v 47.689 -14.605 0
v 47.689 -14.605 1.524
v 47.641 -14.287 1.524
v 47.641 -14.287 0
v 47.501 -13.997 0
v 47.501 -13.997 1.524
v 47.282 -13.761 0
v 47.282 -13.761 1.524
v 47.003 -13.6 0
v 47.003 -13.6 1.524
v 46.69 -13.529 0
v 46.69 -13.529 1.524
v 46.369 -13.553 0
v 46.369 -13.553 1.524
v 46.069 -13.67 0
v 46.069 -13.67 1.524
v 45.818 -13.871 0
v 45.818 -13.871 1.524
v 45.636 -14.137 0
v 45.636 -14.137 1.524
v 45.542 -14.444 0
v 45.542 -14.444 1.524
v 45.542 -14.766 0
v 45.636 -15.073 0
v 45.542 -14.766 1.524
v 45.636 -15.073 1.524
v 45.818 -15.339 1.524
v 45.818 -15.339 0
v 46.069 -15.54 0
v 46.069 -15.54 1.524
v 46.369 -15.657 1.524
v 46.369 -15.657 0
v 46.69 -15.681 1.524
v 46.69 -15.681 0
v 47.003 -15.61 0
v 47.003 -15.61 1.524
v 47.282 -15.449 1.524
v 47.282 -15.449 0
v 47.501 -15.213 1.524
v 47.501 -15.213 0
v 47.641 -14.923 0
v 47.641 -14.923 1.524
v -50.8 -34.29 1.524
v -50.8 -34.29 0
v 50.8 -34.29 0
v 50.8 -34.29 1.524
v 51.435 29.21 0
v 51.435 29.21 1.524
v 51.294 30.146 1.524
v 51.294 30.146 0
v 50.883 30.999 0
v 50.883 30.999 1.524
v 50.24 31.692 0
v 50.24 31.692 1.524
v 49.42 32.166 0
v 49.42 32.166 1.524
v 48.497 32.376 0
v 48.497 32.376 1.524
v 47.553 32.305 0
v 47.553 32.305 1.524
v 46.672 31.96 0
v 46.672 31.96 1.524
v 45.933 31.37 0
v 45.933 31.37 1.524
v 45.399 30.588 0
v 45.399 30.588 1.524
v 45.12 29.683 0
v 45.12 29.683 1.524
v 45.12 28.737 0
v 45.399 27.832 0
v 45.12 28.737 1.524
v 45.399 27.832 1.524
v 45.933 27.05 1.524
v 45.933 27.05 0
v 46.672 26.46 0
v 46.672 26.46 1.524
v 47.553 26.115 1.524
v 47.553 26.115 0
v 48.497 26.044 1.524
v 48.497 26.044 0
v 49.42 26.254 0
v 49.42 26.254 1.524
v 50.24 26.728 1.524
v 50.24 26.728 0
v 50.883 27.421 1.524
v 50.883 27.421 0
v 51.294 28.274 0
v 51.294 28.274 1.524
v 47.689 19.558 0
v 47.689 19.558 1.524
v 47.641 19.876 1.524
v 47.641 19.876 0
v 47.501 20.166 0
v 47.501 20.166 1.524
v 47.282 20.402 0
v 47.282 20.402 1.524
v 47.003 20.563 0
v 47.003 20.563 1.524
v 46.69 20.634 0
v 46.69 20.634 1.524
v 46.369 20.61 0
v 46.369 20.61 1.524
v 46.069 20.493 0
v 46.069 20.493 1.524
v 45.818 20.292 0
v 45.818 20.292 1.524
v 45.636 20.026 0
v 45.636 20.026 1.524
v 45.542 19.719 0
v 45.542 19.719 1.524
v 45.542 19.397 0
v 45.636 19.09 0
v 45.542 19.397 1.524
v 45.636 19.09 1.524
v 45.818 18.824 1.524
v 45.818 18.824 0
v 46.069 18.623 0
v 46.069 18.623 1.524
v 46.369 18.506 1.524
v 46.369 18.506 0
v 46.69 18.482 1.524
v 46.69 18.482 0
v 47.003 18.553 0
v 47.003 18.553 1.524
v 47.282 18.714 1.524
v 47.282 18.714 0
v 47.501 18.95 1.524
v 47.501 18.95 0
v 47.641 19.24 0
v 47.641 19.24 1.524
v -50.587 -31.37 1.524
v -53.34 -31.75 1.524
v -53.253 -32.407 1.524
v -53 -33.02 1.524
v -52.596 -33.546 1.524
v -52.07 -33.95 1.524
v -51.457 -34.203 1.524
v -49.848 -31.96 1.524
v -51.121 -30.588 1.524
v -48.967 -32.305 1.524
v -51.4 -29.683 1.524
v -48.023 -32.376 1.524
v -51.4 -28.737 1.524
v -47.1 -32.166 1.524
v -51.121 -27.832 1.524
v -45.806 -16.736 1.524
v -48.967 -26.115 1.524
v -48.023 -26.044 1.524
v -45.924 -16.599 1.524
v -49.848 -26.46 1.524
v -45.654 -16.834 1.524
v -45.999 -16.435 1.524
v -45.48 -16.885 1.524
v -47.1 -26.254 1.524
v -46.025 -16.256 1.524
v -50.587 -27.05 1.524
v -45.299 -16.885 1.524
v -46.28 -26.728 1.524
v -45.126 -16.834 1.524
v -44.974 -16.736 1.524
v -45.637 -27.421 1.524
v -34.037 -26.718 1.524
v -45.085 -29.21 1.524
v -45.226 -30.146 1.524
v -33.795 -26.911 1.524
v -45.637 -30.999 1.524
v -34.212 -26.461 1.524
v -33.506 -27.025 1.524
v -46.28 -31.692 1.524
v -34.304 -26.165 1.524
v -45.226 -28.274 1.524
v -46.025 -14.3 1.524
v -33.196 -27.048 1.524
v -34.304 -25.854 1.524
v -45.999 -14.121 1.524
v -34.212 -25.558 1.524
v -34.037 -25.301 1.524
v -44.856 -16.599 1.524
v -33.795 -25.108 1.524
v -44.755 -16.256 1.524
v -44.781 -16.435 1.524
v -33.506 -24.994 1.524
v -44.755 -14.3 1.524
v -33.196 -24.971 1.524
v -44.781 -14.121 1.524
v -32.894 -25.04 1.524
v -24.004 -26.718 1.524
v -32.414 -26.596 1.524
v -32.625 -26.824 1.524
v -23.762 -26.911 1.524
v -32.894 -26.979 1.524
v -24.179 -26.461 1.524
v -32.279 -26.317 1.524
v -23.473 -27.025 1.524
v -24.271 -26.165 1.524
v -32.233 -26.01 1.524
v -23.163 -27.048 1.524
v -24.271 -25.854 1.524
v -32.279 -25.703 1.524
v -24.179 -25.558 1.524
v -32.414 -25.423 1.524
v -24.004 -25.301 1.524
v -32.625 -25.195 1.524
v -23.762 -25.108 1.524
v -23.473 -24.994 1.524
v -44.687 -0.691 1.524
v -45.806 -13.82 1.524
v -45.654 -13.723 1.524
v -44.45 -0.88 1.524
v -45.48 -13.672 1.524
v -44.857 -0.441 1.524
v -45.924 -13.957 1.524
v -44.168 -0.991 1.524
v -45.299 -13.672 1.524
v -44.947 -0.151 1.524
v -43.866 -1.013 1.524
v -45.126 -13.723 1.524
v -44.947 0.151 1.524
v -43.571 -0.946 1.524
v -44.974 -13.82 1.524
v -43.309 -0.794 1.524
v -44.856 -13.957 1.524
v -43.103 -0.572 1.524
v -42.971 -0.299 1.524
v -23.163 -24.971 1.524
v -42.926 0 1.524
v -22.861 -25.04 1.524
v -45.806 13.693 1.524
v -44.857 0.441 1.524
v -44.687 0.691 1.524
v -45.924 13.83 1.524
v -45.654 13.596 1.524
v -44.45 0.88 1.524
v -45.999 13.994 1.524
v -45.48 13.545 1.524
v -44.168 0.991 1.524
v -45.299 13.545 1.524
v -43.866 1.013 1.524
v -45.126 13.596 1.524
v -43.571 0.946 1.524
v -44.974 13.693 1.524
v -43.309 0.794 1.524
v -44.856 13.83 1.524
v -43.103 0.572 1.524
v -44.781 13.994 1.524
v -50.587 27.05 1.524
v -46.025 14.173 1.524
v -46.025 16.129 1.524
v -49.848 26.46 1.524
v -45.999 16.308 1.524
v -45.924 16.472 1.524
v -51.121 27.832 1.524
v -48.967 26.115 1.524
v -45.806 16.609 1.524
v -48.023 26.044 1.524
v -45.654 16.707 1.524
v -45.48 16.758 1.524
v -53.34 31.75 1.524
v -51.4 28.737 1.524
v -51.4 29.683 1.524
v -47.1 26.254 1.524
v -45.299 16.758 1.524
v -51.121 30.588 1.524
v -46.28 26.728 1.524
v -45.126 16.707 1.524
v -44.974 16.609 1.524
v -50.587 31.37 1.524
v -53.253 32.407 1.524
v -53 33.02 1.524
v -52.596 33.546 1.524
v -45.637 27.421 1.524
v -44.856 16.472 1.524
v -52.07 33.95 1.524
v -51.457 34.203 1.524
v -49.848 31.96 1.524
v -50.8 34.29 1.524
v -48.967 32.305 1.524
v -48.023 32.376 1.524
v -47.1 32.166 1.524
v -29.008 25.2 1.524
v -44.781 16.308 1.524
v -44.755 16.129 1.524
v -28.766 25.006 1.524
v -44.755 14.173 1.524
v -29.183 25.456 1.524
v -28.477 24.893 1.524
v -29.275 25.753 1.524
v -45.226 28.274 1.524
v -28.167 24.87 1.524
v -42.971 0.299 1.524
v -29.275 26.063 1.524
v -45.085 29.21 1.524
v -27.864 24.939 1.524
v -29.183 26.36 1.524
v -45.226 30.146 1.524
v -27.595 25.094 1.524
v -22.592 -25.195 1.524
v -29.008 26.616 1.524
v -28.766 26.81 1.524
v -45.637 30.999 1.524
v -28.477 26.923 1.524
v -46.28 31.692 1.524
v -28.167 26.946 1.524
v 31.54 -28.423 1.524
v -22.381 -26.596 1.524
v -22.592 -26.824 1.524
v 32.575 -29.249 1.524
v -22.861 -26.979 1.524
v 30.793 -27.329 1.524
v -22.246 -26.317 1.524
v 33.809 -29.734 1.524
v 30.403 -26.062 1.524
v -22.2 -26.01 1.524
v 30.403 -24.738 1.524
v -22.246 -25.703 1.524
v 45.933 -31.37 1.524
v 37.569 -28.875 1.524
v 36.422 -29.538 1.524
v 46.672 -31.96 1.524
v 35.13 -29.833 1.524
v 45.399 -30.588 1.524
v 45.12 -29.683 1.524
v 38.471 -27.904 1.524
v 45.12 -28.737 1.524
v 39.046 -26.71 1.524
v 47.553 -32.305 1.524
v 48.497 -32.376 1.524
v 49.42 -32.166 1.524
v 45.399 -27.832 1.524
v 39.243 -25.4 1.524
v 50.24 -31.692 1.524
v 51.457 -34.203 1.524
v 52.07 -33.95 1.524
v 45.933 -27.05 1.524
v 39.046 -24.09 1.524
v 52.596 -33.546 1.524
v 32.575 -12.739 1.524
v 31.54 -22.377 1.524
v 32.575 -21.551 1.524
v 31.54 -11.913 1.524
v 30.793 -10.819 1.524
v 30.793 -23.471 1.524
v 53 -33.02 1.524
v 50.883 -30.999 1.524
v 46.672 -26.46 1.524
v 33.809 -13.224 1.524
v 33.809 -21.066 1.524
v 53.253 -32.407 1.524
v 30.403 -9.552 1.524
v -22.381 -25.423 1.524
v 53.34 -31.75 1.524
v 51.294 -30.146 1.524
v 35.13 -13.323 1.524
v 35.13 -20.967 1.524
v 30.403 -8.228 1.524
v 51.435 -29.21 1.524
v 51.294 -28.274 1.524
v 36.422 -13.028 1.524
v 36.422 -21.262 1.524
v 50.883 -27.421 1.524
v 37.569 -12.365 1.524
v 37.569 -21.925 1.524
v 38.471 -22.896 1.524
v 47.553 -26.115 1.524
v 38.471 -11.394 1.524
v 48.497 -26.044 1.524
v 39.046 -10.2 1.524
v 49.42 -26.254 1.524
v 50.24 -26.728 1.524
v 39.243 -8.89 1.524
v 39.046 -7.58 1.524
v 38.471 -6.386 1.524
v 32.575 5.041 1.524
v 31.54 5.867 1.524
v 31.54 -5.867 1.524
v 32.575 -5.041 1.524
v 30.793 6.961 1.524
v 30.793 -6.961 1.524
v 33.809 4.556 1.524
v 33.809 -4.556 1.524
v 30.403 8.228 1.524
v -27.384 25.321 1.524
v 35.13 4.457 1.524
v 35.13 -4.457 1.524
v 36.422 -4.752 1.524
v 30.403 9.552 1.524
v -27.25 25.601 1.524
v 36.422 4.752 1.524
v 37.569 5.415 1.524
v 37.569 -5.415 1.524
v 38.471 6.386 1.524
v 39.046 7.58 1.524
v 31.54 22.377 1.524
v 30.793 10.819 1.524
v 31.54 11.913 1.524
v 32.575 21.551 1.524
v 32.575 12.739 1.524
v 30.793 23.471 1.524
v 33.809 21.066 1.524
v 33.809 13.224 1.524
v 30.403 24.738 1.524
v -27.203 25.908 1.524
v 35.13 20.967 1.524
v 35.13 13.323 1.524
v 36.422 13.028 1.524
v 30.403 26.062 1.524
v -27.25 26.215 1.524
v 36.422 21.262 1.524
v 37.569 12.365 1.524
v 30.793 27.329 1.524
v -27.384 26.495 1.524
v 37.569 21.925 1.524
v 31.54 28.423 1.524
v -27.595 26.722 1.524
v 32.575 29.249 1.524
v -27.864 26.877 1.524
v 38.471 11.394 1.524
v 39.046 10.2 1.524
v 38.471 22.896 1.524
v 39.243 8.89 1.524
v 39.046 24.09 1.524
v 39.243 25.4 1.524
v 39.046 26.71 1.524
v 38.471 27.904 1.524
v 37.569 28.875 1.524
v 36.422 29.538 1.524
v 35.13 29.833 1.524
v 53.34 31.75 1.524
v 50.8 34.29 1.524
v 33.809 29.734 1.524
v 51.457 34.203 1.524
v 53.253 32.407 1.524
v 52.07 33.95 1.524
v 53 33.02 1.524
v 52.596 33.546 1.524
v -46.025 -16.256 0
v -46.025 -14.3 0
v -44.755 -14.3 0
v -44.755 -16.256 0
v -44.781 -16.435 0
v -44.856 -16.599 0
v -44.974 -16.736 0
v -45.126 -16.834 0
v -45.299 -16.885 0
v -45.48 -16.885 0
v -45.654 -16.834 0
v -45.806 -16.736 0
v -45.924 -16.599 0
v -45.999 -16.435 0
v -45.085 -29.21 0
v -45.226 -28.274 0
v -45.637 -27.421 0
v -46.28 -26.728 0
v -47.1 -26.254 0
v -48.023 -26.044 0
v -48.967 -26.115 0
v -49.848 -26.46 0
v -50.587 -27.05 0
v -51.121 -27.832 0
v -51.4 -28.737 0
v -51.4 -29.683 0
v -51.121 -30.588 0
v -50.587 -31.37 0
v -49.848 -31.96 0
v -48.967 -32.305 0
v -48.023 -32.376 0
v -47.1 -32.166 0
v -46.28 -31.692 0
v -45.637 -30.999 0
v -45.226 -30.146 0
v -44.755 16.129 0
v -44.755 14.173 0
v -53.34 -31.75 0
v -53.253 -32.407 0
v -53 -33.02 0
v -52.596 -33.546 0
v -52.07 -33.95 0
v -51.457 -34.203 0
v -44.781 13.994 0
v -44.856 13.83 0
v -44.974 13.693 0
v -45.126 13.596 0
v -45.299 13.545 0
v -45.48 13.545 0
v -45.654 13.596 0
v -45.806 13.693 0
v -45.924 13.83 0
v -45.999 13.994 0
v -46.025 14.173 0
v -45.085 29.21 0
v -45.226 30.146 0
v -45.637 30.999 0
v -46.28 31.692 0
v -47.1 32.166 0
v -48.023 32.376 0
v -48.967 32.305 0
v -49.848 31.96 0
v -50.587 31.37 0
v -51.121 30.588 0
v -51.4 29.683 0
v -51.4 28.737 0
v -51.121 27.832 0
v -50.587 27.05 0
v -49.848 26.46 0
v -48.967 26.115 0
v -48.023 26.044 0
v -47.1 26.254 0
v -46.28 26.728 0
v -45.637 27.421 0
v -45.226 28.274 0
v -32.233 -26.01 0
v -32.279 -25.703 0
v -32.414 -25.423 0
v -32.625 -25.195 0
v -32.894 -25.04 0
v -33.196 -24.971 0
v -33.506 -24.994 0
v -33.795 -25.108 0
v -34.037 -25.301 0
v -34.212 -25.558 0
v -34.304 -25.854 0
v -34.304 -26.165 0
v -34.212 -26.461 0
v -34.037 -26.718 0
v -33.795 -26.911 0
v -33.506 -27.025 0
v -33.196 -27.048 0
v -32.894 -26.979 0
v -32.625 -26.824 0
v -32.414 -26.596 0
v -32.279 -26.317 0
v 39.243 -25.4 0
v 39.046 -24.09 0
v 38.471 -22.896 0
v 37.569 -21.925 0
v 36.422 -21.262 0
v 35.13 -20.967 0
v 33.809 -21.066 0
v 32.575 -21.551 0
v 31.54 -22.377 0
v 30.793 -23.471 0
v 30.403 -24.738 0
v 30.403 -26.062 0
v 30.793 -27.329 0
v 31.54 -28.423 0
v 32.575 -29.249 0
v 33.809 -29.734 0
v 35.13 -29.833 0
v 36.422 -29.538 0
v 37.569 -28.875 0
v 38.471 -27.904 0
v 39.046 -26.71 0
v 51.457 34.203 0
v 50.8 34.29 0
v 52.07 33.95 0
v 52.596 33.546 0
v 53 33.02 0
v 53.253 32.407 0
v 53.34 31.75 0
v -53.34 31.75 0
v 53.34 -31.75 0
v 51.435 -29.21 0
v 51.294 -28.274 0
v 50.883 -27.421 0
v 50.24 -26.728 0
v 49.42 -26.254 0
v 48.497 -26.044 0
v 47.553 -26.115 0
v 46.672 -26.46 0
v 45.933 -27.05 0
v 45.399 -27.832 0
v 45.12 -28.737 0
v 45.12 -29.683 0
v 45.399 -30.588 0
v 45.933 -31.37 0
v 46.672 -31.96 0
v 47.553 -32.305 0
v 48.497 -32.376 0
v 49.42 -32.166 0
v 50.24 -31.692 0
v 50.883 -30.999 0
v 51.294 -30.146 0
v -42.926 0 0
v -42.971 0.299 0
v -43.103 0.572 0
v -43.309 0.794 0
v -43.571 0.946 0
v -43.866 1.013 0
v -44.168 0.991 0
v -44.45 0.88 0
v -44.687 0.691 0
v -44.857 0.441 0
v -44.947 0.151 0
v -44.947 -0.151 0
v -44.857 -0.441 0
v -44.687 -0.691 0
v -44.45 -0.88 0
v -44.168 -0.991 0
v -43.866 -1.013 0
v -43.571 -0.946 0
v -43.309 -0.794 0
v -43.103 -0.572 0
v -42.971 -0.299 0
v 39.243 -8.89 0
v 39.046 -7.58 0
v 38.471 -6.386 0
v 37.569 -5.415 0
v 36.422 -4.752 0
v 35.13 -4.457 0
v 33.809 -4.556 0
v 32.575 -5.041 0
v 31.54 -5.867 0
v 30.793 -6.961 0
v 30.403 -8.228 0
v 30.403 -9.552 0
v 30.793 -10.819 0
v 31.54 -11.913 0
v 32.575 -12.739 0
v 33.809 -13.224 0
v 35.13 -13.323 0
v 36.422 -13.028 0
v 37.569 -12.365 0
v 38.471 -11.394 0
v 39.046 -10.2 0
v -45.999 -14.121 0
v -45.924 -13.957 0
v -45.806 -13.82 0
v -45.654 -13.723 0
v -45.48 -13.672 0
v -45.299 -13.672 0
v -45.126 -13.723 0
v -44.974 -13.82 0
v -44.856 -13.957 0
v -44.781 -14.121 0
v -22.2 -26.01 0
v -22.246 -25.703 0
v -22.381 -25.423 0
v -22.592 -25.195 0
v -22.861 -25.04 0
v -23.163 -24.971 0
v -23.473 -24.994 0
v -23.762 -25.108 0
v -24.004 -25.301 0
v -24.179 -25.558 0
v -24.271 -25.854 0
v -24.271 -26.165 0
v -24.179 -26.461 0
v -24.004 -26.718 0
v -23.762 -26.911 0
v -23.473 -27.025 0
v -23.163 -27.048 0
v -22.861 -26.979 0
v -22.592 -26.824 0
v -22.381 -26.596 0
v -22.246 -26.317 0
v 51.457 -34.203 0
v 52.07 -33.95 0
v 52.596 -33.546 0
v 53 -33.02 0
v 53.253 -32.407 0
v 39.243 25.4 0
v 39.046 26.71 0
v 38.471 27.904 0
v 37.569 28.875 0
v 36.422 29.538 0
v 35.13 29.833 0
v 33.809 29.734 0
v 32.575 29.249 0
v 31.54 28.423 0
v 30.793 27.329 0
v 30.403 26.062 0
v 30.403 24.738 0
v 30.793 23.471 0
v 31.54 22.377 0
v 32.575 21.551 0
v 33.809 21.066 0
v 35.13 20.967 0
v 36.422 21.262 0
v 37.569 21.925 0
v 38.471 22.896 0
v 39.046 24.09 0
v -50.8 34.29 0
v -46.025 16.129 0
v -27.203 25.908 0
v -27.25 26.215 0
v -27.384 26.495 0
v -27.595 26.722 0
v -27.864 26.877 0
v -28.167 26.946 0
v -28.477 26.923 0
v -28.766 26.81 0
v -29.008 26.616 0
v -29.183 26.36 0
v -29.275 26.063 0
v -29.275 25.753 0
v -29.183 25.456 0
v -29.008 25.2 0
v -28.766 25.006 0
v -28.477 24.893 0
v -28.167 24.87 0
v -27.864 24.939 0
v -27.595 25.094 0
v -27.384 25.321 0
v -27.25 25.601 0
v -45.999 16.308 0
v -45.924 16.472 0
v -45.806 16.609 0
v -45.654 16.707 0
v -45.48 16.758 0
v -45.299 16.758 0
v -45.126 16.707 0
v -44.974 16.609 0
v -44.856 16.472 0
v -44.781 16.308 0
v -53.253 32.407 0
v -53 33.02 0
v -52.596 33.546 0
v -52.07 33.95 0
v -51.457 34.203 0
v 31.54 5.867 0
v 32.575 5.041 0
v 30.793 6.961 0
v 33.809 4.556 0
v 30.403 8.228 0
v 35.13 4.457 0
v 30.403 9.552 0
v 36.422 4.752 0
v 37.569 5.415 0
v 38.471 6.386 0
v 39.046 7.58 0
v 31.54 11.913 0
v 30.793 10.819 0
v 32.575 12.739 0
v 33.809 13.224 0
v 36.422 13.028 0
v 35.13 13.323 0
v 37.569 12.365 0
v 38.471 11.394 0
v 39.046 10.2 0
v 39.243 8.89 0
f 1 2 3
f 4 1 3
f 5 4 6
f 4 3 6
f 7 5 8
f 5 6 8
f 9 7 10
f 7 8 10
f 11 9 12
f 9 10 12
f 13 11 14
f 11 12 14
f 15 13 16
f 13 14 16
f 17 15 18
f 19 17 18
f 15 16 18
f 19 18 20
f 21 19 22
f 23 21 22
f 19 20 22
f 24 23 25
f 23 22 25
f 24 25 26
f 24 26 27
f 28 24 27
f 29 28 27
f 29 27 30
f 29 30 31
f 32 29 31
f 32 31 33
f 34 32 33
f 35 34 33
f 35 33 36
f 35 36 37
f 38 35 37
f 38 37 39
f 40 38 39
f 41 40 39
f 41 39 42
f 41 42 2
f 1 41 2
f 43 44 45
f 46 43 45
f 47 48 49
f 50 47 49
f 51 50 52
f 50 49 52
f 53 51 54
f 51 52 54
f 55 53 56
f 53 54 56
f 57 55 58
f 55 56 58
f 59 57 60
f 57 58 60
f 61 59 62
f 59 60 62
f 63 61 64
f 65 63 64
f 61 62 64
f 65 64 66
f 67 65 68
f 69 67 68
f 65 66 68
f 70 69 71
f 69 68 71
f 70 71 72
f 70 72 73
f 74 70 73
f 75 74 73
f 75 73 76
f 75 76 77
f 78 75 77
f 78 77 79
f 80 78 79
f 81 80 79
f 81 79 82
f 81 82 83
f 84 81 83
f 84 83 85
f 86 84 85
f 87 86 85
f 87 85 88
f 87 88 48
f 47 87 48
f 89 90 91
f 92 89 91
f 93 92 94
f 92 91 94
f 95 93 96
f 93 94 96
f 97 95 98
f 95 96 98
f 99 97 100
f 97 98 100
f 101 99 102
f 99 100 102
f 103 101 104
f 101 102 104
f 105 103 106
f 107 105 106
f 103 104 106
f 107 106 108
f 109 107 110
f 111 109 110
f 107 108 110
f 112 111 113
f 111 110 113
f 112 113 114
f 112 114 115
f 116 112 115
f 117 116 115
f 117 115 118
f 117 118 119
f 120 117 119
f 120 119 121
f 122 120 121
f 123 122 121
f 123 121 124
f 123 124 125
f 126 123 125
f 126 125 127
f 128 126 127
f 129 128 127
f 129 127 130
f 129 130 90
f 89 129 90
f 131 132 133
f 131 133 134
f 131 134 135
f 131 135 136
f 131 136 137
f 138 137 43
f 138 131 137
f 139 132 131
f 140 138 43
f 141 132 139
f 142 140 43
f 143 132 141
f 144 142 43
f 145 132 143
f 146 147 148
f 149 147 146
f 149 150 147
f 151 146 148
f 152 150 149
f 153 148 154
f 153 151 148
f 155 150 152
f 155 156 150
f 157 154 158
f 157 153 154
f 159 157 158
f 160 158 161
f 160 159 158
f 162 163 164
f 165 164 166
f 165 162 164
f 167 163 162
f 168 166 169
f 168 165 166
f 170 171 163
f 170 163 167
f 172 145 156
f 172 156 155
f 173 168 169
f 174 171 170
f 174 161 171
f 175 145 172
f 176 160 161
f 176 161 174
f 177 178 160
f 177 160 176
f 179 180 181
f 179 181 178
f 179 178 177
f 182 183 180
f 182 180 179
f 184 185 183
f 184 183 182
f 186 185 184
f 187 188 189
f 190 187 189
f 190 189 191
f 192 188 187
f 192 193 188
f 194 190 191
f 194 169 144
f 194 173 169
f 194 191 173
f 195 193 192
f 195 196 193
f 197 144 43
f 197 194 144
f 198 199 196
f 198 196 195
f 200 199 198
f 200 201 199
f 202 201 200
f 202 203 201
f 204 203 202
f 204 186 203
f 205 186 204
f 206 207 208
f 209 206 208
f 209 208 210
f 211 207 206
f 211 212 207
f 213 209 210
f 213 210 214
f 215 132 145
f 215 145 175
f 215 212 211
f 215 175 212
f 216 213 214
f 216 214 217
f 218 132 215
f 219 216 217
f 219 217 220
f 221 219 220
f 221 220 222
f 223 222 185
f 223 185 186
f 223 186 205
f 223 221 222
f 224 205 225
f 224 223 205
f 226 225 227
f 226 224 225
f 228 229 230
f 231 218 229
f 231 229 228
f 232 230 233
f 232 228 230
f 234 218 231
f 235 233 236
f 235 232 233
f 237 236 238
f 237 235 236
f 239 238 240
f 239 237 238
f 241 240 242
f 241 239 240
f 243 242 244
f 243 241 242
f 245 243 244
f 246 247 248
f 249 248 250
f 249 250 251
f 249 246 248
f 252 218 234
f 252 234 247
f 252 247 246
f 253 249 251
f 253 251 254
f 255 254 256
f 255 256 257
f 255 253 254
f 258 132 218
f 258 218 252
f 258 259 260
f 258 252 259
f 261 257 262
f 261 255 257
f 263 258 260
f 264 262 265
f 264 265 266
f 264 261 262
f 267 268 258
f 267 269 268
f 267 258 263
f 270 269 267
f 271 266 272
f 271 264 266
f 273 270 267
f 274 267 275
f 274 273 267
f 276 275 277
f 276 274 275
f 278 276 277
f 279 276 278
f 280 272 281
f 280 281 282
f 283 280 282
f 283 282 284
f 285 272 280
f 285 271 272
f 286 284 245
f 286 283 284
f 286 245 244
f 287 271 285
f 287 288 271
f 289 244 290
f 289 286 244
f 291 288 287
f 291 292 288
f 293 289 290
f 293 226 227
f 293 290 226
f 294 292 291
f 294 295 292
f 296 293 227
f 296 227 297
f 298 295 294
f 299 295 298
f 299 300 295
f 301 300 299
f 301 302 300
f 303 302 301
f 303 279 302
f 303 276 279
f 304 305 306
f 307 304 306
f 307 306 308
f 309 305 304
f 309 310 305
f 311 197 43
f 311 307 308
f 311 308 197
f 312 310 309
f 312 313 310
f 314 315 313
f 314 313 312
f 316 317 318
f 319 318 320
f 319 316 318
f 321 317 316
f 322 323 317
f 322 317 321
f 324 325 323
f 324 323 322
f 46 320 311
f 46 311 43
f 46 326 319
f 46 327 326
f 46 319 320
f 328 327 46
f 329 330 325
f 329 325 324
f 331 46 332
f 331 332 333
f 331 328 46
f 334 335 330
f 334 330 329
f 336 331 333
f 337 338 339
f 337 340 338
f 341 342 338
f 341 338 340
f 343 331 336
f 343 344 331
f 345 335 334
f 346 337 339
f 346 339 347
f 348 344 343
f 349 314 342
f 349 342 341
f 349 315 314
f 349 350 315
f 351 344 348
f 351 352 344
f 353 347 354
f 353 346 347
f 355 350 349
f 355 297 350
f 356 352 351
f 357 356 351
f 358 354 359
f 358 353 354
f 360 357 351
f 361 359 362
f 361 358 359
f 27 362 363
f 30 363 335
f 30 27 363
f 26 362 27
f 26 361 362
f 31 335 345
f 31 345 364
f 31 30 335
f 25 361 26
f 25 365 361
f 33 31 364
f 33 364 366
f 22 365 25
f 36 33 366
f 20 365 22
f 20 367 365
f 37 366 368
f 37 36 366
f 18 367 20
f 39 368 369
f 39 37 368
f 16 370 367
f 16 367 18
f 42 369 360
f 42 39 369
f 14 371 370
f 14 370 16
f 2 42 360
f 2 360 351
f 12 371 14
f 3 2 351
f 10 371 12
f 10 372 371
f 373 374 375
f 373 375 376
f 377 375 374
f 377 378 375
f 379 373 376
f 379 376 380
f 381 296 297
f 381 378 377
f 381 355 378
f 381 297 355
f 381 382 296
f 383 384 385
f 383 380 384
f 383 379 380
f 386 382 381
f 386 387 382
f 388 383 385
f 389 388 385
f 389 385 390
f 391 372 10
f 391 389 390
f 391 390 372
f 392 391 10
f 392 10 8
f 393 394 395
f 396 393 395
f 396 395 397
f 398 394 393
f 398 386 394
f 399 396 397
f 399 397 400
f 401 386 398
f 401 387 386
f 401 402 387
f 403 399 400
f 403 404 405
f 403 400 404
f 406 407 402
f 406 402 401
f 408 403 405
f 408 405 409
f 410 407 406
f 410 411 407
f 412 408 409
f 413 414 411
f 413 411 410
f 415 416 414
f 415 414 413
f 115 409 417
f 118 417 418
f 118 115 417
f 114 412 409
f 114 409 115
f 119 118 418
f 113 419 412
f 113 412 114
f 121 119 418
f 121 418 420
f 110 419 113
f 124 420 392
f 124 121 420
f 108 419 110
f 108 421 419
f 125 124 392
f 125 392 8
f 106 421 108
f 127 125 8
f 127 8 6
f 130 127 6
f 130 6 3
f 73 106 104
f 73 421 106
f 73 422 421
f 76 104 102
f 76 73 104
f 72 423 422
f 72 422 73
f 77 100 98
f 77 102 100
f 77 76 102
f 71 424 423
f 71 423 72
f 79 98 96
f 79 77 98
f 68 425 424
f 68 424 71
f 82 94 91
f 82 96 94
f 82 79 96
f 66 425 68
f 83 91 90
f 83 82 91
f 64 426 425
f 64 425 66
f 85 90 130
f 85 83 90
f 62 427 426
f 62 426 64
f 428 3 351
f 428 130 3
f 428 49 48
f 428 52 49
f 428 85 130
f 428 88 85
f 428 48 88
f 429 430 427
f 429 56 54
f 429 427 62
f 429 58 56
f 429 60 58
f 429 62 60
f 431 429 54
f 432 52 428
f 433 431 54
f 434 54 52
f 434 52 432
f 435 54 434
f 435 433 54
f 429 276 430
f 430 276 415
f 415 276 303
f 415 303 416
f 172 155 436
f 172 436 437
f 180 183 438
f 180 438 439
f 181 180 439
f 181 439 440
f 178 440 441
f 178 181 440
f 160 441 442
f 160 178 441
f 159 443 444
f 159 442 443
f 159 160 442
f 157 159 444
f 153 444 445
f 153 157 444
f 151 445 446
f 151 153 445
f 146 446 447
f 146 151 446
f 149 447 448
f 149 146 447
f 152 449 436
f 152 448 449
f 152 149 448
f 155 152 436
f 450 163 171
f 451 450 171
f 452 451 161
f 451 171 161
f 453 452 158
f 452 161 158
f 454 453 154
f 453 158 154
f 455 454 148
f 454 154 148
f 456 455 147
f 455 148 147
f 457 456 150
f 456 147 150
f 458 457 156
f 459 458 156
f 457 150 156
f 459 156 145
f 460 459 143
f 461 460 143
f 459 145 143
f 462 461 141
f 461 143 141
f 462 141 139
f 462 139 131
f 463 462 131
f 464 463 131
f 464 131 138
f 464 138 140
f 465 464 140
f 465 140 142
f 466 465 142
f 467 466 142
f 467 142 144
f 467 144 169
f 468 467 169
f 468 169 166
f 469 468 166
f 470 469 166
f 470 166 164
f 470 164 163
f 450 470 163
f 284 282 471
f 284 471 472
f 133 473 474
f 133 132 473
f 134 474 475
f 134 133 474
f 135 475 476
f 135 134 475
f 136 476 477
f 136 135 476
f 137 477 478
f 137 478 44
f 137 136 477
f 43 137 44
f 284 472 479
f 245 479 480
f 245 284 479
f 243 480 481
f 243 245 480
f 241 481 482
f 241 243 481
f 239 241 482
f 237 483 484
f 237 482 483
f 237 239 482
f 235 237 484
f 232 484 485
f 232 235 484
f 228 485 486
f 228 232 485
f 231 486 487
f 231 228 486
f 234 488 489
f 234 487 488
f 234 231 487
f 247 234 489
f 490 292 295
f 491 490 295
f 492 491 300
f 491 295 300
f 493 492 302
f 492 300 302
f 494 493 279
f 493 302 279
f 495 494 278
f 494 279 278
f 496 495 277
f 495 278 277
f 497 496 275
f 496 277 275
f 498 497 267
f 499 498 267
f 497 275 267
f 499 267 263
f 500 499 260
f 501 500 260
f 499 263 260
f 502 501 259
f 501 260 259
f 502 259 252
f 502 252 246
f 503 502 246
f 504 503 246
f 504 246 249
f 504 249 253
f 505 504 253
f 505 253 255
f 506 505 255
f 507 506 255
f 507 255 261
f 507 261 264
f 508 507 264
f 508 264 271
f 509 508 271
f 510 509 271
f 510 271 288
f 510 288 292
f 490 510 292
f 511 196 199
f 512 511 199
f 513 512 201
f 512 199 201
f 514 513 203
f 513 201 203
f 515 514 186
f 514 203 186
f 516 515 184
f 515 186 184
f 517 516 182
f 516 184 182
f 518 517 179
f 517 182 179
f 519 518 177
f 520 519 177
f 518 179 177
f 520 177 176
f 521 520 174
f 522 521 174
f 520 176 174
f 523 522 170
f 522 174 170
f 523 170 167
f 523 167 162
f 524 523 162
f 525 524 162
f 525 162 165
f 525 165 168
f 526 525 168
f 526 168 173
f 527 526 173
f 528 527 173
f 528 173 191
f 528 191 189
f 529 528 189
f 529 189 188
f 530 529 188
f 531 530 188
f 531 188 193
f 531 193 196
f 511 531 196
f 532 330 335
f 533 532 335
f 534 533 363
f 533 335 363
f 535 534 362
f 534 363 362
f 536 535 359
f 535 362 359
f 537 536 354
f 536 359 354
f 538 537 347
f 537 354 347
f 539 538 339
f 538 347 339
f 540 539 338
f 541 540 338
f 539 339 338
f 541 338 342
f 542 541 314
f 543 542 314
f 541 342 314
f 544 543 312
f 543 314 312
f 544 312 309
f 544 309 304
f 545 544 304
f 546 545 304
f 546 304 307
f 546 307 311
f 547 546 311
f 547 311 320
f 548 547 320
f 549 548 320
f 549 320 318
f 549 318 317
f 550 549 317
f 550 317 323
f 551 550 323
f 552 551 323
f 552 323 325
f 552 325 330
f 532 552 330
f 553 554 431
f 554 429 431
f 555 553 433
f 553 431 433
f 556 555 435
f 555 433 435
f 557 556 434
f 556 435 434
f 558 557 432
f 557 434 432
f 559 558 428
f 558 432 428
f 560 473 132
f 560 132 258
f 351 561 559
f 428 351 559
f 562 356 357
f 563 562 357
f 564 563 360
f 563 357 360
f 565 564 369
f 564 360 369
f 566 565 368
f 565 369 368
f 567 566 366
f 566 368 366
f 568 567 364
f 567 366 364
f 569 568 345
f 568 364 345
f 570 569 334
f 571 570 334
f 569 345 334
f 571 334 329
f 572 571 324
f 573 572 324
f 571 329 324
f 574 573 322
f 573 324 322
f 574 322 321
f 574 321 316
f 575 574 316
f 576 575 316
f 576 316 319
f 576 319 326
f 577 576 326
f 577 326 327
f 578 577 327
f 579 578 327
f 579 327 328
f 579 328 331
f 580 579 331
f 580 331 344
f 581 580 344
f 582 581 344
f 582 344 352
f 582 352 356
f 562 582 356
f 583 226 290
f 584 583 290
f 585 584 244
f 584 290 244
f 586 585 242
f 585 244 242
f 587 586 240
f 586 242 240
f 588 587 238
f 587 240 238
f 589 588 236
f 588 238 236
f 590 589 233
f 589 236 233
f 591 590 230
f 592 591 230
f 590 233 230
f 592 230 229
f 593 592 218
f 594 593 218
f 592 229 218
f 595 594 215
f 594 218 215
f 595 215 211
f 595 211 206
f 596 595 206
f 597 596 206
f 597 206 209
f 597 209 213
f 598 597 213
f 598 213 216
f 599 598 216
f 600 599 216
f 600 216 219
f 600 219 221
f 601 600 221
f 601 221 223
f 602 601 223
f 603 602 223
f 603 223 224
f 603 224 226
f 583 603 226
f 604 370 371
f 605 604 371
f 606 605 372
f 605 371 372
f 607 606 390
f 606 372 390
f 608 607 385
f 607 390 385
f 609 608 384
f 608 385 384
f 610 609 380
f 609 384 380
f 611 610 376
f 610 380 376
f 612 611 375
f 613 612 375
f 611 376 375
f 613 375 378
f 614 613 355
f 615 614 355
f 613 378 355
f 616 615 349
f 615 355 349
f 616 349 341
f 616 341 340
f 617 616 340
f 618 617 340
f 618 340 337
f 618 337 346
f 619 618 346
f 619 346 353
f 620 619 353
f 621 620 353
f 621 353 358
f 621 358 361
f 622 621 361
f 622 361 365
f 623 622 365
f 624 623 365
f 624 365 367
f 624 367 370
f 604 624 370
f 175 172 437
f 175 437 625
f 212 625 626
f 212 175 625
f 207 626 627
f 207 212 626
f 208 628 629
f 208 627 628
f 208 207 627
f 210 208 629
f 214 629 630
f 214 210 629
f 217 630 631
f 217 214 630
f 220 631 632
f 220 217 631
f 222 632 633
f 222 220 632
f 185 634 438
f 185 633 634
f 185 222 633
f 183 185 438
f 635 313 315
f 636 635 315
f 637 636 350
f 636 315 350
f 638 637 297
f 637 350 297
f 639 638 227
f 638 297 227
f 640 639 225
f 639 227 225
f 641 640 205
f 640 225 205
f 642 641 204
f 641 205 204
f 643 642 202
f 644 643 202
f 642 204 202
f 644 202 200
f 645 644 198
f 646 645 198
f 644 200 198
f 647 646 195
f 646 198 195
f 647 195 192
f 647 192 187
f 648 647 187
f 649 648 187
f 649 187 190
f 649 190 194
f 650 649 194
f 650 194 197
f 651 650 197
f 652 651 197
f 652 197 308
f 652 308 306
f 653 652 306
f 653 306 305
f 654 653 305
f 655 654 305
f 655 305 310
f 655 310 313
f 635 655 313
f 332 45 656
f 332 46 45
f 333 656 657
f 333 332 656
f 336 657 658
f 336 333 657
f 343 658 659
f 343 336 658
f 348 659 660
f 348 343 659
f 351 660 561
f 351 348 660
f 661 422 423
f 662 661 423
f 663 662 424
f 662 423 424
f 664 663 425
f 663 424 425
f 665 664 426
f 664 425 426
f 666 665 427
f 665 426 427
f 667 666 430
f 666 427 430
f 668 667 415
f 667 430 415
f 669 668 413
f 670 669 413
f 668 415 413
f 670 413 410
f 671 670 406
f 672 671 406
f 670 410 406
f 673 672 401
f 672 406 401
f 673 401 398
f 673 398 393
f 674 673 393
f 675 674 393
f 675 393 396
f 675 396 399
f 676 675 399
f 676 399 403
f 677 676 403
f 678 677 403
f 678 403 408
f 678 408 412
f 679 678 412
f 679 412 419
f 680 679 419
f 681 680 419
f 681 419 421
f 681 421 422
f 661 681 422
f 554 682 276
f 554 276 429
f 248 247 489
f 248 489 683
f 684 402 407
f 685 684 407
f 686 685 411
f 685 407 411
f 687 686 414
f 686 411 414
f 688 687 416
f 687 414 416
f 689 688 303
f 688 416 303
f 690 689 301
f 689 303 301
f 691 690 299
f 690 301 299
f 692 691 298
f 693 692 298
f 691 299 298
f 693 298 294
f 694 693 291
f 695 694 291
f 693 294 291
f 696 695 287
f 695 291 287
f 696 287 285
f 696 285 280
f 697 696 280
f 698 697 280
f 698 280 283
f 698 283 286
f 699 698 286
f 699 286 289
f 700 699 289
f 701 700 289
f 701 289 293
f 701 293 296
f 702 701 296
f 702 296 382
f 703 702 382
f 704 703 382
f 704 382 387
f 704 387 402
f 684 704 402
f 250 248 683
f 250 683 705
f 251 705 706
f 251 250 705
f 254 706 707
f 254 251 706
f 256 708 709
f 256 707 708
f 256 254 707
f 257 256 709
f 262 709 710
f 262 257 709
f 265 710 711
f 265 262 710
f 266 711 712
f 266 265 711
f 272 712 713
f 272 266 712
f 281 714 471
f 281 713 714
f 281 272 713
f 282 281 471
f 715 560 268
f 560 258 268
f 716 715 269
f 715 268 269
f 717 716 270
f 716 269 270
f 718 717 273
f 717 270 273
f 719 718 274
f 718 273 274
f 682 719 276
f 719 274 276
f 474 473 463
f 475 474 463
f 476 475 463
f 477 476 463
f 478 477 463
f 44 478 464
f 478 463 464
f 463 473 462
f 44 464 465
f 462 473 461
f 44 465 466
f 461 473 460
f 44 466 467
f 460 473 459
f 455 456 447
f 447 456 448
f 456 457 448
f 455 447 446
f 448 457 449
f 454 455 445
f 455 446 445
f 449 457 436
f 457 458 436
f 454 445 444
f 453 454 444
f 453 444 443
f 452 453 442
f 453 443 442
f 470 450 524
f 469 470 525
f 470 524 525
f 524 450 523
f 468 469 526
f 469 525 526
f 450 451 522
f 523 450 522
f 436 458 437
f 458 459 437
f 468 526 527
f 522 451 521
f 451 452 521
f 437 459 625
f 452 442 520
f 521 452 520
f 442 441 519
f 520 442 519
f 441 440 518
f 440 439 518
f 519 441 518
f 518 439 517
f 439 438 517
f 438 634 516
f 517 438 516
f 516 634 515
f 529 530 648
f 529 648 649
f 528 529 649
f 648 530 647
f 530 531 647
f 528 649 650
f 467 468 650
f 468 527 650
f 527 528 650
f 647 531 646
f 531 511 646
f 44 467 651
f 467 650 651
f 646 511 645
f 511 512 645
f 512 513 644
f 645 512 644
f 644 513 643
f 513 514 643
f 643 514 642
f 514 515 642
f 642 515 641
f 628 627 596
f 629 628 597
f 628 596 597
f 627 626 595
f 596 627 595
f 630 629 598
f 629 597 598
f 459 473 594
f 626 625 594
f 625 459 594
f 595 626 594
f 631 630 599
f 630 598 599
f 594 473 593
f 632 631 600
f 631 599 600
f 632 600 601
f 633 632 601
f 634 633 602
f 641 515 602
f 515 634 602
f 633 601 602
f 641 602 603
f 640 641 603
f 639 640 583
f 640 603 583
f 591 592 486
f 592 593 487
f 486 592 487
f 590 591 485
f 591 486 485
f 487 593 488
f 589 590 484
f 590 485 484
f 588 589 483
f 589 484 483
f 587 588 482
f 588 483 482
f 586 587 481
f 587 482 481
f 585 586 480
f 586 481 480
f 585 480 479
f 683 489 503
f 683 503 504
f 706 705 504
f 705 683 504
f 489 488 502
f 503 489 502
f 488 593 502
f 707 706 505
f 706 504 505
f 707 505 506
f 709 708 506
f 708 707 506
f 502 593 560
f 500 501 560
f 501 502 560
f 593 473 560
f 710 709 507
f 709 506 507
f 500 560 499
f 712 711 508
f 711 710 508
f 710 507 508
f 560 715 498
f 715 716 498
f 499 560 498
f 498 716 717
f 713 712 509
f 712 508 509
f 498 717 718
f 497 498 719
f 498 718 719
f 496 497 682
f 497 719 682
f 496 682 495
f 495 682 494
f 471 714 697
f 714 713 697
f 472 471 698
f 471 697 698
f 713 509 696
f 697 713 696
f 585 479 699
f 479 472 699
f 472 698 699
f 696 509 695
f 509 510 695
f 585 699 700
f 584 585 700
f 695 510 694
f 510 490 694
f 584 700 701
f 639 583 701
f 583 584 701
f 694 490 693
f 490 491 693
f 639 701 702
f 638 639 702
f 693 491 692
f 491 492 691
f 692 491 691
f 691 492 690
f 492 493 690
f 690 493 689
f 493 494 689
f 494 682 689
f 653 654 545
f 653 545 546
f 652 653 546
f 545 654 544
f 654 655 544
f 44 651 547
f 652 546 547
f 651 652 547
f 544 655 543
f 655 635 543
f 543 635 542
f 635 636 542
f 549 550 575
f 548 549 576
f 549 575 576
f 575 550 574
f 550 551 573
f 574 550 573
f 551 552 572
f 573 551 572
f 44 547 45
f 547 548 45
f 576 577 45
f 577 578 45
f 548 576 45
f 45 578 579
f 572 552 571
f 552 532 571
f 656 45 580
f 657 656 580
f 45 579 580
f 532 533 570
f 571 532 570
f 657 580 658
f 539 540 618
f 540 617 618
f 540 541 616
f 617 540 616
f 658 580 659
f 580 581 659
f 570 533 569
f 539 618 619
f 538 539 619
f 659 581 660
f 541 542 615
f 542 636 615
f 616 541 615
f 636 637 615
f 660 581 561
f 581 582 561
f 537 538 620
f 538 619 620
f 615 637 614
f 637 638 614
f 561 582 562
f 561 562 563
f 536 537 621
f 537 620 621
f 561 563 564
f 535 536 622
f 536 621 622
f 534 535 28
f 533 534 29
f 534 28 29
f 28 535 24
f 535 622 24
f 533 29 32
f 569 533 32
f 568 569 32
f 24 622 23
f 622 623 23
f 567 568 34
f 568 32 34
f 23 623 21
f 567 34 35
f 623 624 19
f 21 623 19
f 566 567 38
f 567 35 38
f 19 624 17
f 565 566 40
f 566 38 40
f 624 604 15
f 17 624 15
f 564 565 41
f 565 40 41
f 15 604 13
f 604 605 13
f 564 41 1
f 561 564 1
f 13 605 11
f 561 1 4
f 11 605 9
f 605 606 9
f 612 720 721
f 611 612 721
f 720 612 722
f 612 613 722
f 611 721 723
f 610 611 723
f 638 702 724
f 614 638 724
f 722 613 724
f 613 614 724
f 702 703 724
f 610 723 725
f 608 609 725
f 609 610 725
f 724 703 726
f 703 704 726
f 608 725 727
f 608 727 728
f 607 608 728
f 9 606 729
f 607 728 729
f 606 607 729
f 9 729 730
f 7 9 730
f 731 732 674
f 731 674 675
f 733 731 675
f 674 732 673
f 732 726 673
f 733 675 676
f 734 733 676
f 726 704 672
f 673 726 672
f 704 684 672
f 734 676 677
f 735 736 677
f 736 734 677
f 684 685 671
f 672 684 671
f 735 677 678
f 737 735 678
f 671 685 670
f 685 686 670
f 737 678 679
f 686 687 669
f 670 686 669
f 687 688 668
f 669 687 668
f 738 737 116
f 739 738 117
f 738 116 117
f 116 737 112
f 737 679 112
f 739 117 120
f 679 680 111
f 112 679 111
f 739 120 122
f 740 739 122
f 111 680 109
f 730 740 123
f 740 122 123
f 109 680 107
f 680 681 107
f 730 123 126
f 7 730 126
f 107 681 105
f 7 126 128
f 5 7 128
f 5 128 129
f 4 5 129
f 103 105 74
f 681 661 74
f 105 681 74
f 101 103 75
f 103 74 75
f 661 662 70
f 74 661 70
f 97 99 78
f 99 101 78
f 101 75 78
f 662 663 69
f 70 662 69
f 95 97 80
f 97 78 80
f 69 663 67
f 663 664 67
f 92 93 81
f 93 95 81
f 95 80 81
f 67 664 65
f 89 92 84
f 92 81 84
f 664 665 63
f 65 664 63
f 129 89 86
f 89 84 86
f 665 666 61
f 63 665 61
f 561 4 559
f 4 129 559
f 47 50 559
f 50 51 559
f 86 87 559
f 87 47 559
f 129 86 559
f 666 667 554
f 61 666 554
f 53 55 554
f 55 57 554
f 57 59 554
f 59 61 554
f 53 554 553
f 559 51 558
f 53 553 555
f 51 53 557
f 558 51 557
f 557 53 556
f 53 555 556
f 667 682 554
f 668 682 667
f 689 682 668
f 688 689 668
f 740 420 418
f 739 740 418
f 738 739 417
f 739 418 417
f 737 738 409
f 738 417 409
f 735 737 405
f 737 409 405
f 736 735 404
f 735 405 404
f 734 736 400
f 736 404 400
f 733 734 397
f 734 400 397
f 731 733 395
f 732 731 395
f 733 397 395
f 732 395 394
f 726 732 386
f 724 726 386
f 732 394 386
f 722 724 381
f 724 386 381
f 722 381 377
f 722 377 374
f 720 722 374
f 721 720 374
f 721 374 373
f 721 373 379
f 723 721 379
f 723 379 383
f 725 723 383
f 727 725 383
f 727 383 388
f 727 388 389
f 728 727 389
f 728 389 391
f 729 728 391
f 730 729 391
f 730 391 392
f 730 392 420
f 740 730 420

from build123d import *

# Parameters (mm, degrees)
SKETCH1_W           = 106.68
SKETCH1_H           = 68.58
BOSS_EXTRUDE1_DEPTH = 1.524
CUT_EXTRUDE1_REACH  = 65.429
SKETCH2_R           = 3.175
CUT_EXTRUDE2_REACH  = 65.429
SKETCH3_R           = 4.445
FILLET1_R           = 2.54
CUT_EXTRUDE3_REACH  = 65.429
SKETCH4_R           = 1.0414
SKETCH4_R_2         = 1.0795
CUT_EXTRUDE4_REACH  = 65.429
SKETCH5_R           = 1.016
CUT_EXTRUDE5_REACH  = 65.429


with BuildPart() as part:
    # Sketch1 → Boss-Extrude1 (new body)
    with BuildSketch(Plane.XY):
        Rectangle(SKETCH1_W, SKETCH1_H)
    extrude(amount=BOSS_EXTRUDE1_DEPTH)

    # Sketch2 → Cut-Extrude1 (cut, up to next)
    with BuildSketch(Plane.XY.offset(1.524), mode=Mode.PRIVATE) as cut_extrude1_sk1:
        with Locations((-48.26, 29.21)):
            Circle(SKETCH2_R)
    cut_extrude1_tool1 = extrude(cut_extrude1_sk1.sketch, amount=-CUT_EXTRUDE1_REACH, mode=Mode.PRIVATE) & part.part
    # Sketch2 → Cut-Extrude1 (cut, up to next)
    with BuildSketch(Plane.XY.offset(1.524), mode=Mode.PRIVATE) as cut_extrude1_sk2:
        with Locations((-48.26, -29.21)):
            Circle(SKETCH2_R)
    cut_extrude1_tool2 = extrude(cut_extrude1_sk2.sketch, amount=-CUT_EXTRUDE1_REACH, mode=Mode.PRIVATE) & part.part
    # Sketch2 → Cut-Extrude1 (cut, up to next)
    with BuildSketch(Plane.XY.offset(1.524), mode=Mode.PRIVATE) as cut_extrude1_sk3:
        with Locations((48.26, -29.21)):
            Circle(SKETCH2_R)
    cut_extrude1_tool3 = extrude(cut_extrude1_sk3.sketch, amount=-CUT_EXTRUDE1_REACH, mode=Mode.PRIVATE) & part.part
    # Sketch2 → Cut-Extrude1 (cut, up to next)
    with BuildSketch(Plane.XY.offset(1.524), mode=Mode.PRIVATE) as cut_extrude1_sk4:
        with Locations((48.26, 29.21)):
            Circle(SKETCH2_R)
    cut_extrude1_tool4 = extrude(cut_extrude1_sk4.sketch, amount=-CUT_EXTRUDE1_REACH, mode=Mode.PRIVATE) & part.part
    add(cut_extrude1_tool1.solids().sort_by_distance((-48.26, 29.21, 1.524))[0], mode=Mode.SUBTRACT)
    add(cut_extrude1_tool2.solids().sort_by_distance((-48.26, -29.21, 1.524))[0], mode=Mode.SUBTRACT)
    add(cut_extrude1_tool3.solids().sort_by_distance((48.26, -29.21, 1.524))[0], mode=Mode.SUBTRACT)
    add(cut_extrude1_tool4.solids().sort_by_distance((48.26, 29.21, 1.524))[0], mode=Mode.SUBTRACT)

    # Sketch3 → Cut-Extrude2 (cut, up to next)
    with BuildSketch(Plane.XY.offset(1.524), mode=Mode.PRIVATE) as cut_extrude2_sk1:
        with Locations((34.798, -25.4)):
            Circle(SKETCH3_R)
    cut_extrude2_tool1 = extrude(cut_extrude2_sk1.sketch, amount=-CUT_EXTRUDE2_REACH, mode=Mode.PRIVATE) & part.part
    # Sketch3 → Cut-Extrude2 (cut, up to next)
    with BuildSketch(Plane.XY.offset(1.524), mode=Mode.PRIVATE) as cut_extrude2_sk2:
        with Locations((34.798, -8.89)):
            Circle(SKETCH3_R)
    cut_extrude2_tool2 = extrude(cut_extrude2_sk2.sketch, amount=-CUT_EXTRUDE2_REACH, mode=Mode.PRIVATE) & part.part
    # Sketch3 → Cut-Extrude2 (cut, up to next)
    with BuildSketch(Plane.XY.offset(1.524), mode=Mode.PRIVATE) as cut_extrude2_sk3:
        with Locations((34.798, 8.89)):
            Circle(SKETCH3_R)
    cut_extrude2_tool3 = extrude(cut_extrude2_sk3.sketch, amount=-CUT_EXTRUDE2_REACH, mode=Mode.PRIVATE) & part.part
    # Sketch3 → Cut-Extrude2 (cut, up to next)
    with BuildSketch(Plane.XY.offset(1.524), mode=Mode.PRIVATE) as cut_extrude2_sk4:
        with Locations((34.798, 25.4)):
            Circle(SKETCH3_R)
    cut_extrude2_tool4 = extrude(cut_extrude2_sk4.sketch, amount=-CUT_EXTRUDE2_REACH, mode=Mode.PRIVATE) & part.part
    add(cut_extrude2_tool1.solids().sort_by_distance((34.798, -25.4, 1.524))[0], mode=Mode.SUBTRACT)
    add(cut_extrude2_tool2.solids().sort_by_distance((34.798, -8.89, 1.524))[0], mode=Mode.SUBTRACT)
    add(cut_extrude2_tool3.solids().sort_by_distance((34.798, 8.89, 1.524))[0], mode=Mode.SUBTRACT)
    add(cut_extrude2_tool4.solids().sort_by_distance((34.798, 25.4, 1.524))[0], mode=Mode.SUBTRACT)

    # Fillet1
    fillet1_edges = [part.edges().sort_by_distance(p)[0] for p in [
        (53.34, -34.29, 0.762),
        (-53.34, -34.29, 0.762),
        (-53.34, 34.29, 0.762),
        (53.34, 34.29, 0.762),
    ]]
    fillet(fillet1_edges, radius=FILLET1_R)

    # Sketch4 → Cut-Extrude3 (cut, up to next)
    with BuildSketch(Plane.XY.offset(1.524), mode=Mode.PRIVATE) as cut_extrude3_sk1:
        with Locations((-23.241, -26.0096)):
            Circle(SKETCH4_R)
    cut_extrude3_tool1 = extrude(cut_extrude3_sk1.sketch, amount=-CUT_EXTRUDE3_REACH, mode=Mode.PRIVATE) & part.part
    # Sketch4 → Cut-Extrude3 (cut, up to next)
    with BuildSketch(Plane.XY.offset(1.524), mode=Mode.PRIVATE) as cut_extrude3_sk2:
        with Locations((-33.274, -26.0096)):
            Circle(SKETCH4_R)
    cut_extrude3_tool2 = extrude(cut_extrude3_sk2.sketch, amount=-CUT_EXTRUDE3_REACH, mode=Mode.PRIVATE) & part.part
    # Sketch4 → Cut-Extrude3 (cut, up to next)
    with BuildSketch(Plane.XY.offset(1.524), mode=Mode.PRIVATE) as cut_extrude3_sk3:
        with Locations((-28.2448, 25.908)):
            Circle(SKETCH4_R)
    cut_extrude3_tool3 = extrude(cut_extrude3_sk3.sketch, amount=-CUT_EXTRUDE3_REACH, mode=Mode.PRIVATE) & part.part
    # Sketch4 → Cut-Extrude3 (cut, up to next)
    with BuildSketch(Plane.XY.offset(1.524), mode=Mode.PRIVATE) as cut_extrude3_sk4:
        with Locations((46.609, 19.558)):
            Circle(SKETCH4_R_2)
    cut_extrude3_tool4 = extrude(cut_extrude3_sk4.sketch, amount=-CUT_EXTRUDE3_REACH, mode=Mode.PRIVATE) & part.part
    # Sketch4 → Cut-Extrude3 (cut, up to next)
    with BuildSketch(Plane.XY.offset(1.524), mode=Mode.PRIVATE) as cut_extrude3_sk5:
        with Locations((46.609, -14.605)):
            Circle(SKETCH4_R_2)
    cut_extrude3_tool5 = extrude(cut_extrude3_sk5.sketch, amount=-CUT_EXTRUDE3_REACH, mode=Mode.PRIVATE) & part.part
    add(cut_extrude3_tool1.solids().sort_by_distance((-23.241, -26.0096, 1.524))[0], mode=Mode.SUBTRACT)
    add(cut_extrude3_tool2.solids().sort_by_distance((-33.274, -26.0096, 1.524))[0], mode=Mode.SUBTRACT)
    add(cut_extrude3_tool3.solids().sort_by_distance((-28.2448, 25.908, 1.524))[0], mode=Mode.SUBTRACT)
    add(cut_extrude3_tool4.solids().sort_by_distance((46.609, 19.558, 1.524))[0], mode=Mode.SUBTRACT)
    add(cut_extrude3_tool5.solids().sort_by_distance((46.609, -14.605, 1.524))[0], mode=Mode.SUBTRACT)

    # Sketch5 → Cut-Extrude4 (cut, up to next)
    with BuildSketch(Plane.XY.offset(1.524), mode=Mode.PRIVATE) as cut_extrude4_sk1:
        with Locations((-43.942, 0)):
            Circle(SKETCH5_R)
    cut_extrude4_tool1 = extrude(cut_extrude4_sk1.sketch, amount=-CUT_EXTRUDE4_REACH, mode=Mode.PRIVATE) & part.part
    add(cut_extrude4_tool1.solids().sort_by_distance((-43.942, 0, 1.524))[0], mode=Mode.SUBTRACT)

    # Sketch6 → Cut-Extrude5 (cut, up to next)
    with BuildSketch(Plane.XY.offset(1.524), mode=Mode.PRIVATE) as cut_extrude5_sk1:
        with BuildLine():
            Line((-44.7548, 16.129), (-44.7548, 14.1732))
            ThreePointArc((-44.7548, 14.1732), (-45.3898, 13.5382), (-46.0248, 14.1732))
            Line((-46.0248, 14.1732), (-46.0248, 16.129))
            ThreePointArc((-46.0248, 16.129), (-45.3898, 16.764), (-44.7548, 16.129))
        make_face()
    cut_extrude5_tool1 = extrude(cut_extrude5_sk1.sketch, amount=-CUT_EXTRUDE5_REACH, mode=Mode.PRIVATE) & part.part
    # Sketch6 → Cut-Extrude5 (cut, up to next)
    with BuildSketch(Plane.XY.offset(1.524), mode=Mode.PRIVATE) as cut_extrude5_sk2:
        with BuildLine():
            Line((-44.7548, -14.3002), (-44.7548, -16.256))
            ThreePointArc((-44.7548, -16.256), (-45.3898, -16.891), (-46.0248, -16.256))
            Line((-46.0248, -16.256), (-46.0248, -14.3002))
            ThreePointArc((-46.0248, -14.3002), (-45.3898, -13.6652), (-44.7548, -14.3002))
        make_face()
    cut_extrude5_tool2 = extrude(cut_extrude5_sk2.sketch, amount=-CUT_EXTRUDE5_REACH, mode=Mode.PRIVATE) & part.part
    add(cut_extrude5_tool1.solids().sort_by_distance((-45.3898, 15.1511, 1.524))[0], mode=Mode.SUBTRACT)
    add(cut_extrude5_tool2.solids().sort_by_distance((-45.3898, -15.2781, 1.524))[0], mode=Mode.SUBTRACT)


solid = part.part
